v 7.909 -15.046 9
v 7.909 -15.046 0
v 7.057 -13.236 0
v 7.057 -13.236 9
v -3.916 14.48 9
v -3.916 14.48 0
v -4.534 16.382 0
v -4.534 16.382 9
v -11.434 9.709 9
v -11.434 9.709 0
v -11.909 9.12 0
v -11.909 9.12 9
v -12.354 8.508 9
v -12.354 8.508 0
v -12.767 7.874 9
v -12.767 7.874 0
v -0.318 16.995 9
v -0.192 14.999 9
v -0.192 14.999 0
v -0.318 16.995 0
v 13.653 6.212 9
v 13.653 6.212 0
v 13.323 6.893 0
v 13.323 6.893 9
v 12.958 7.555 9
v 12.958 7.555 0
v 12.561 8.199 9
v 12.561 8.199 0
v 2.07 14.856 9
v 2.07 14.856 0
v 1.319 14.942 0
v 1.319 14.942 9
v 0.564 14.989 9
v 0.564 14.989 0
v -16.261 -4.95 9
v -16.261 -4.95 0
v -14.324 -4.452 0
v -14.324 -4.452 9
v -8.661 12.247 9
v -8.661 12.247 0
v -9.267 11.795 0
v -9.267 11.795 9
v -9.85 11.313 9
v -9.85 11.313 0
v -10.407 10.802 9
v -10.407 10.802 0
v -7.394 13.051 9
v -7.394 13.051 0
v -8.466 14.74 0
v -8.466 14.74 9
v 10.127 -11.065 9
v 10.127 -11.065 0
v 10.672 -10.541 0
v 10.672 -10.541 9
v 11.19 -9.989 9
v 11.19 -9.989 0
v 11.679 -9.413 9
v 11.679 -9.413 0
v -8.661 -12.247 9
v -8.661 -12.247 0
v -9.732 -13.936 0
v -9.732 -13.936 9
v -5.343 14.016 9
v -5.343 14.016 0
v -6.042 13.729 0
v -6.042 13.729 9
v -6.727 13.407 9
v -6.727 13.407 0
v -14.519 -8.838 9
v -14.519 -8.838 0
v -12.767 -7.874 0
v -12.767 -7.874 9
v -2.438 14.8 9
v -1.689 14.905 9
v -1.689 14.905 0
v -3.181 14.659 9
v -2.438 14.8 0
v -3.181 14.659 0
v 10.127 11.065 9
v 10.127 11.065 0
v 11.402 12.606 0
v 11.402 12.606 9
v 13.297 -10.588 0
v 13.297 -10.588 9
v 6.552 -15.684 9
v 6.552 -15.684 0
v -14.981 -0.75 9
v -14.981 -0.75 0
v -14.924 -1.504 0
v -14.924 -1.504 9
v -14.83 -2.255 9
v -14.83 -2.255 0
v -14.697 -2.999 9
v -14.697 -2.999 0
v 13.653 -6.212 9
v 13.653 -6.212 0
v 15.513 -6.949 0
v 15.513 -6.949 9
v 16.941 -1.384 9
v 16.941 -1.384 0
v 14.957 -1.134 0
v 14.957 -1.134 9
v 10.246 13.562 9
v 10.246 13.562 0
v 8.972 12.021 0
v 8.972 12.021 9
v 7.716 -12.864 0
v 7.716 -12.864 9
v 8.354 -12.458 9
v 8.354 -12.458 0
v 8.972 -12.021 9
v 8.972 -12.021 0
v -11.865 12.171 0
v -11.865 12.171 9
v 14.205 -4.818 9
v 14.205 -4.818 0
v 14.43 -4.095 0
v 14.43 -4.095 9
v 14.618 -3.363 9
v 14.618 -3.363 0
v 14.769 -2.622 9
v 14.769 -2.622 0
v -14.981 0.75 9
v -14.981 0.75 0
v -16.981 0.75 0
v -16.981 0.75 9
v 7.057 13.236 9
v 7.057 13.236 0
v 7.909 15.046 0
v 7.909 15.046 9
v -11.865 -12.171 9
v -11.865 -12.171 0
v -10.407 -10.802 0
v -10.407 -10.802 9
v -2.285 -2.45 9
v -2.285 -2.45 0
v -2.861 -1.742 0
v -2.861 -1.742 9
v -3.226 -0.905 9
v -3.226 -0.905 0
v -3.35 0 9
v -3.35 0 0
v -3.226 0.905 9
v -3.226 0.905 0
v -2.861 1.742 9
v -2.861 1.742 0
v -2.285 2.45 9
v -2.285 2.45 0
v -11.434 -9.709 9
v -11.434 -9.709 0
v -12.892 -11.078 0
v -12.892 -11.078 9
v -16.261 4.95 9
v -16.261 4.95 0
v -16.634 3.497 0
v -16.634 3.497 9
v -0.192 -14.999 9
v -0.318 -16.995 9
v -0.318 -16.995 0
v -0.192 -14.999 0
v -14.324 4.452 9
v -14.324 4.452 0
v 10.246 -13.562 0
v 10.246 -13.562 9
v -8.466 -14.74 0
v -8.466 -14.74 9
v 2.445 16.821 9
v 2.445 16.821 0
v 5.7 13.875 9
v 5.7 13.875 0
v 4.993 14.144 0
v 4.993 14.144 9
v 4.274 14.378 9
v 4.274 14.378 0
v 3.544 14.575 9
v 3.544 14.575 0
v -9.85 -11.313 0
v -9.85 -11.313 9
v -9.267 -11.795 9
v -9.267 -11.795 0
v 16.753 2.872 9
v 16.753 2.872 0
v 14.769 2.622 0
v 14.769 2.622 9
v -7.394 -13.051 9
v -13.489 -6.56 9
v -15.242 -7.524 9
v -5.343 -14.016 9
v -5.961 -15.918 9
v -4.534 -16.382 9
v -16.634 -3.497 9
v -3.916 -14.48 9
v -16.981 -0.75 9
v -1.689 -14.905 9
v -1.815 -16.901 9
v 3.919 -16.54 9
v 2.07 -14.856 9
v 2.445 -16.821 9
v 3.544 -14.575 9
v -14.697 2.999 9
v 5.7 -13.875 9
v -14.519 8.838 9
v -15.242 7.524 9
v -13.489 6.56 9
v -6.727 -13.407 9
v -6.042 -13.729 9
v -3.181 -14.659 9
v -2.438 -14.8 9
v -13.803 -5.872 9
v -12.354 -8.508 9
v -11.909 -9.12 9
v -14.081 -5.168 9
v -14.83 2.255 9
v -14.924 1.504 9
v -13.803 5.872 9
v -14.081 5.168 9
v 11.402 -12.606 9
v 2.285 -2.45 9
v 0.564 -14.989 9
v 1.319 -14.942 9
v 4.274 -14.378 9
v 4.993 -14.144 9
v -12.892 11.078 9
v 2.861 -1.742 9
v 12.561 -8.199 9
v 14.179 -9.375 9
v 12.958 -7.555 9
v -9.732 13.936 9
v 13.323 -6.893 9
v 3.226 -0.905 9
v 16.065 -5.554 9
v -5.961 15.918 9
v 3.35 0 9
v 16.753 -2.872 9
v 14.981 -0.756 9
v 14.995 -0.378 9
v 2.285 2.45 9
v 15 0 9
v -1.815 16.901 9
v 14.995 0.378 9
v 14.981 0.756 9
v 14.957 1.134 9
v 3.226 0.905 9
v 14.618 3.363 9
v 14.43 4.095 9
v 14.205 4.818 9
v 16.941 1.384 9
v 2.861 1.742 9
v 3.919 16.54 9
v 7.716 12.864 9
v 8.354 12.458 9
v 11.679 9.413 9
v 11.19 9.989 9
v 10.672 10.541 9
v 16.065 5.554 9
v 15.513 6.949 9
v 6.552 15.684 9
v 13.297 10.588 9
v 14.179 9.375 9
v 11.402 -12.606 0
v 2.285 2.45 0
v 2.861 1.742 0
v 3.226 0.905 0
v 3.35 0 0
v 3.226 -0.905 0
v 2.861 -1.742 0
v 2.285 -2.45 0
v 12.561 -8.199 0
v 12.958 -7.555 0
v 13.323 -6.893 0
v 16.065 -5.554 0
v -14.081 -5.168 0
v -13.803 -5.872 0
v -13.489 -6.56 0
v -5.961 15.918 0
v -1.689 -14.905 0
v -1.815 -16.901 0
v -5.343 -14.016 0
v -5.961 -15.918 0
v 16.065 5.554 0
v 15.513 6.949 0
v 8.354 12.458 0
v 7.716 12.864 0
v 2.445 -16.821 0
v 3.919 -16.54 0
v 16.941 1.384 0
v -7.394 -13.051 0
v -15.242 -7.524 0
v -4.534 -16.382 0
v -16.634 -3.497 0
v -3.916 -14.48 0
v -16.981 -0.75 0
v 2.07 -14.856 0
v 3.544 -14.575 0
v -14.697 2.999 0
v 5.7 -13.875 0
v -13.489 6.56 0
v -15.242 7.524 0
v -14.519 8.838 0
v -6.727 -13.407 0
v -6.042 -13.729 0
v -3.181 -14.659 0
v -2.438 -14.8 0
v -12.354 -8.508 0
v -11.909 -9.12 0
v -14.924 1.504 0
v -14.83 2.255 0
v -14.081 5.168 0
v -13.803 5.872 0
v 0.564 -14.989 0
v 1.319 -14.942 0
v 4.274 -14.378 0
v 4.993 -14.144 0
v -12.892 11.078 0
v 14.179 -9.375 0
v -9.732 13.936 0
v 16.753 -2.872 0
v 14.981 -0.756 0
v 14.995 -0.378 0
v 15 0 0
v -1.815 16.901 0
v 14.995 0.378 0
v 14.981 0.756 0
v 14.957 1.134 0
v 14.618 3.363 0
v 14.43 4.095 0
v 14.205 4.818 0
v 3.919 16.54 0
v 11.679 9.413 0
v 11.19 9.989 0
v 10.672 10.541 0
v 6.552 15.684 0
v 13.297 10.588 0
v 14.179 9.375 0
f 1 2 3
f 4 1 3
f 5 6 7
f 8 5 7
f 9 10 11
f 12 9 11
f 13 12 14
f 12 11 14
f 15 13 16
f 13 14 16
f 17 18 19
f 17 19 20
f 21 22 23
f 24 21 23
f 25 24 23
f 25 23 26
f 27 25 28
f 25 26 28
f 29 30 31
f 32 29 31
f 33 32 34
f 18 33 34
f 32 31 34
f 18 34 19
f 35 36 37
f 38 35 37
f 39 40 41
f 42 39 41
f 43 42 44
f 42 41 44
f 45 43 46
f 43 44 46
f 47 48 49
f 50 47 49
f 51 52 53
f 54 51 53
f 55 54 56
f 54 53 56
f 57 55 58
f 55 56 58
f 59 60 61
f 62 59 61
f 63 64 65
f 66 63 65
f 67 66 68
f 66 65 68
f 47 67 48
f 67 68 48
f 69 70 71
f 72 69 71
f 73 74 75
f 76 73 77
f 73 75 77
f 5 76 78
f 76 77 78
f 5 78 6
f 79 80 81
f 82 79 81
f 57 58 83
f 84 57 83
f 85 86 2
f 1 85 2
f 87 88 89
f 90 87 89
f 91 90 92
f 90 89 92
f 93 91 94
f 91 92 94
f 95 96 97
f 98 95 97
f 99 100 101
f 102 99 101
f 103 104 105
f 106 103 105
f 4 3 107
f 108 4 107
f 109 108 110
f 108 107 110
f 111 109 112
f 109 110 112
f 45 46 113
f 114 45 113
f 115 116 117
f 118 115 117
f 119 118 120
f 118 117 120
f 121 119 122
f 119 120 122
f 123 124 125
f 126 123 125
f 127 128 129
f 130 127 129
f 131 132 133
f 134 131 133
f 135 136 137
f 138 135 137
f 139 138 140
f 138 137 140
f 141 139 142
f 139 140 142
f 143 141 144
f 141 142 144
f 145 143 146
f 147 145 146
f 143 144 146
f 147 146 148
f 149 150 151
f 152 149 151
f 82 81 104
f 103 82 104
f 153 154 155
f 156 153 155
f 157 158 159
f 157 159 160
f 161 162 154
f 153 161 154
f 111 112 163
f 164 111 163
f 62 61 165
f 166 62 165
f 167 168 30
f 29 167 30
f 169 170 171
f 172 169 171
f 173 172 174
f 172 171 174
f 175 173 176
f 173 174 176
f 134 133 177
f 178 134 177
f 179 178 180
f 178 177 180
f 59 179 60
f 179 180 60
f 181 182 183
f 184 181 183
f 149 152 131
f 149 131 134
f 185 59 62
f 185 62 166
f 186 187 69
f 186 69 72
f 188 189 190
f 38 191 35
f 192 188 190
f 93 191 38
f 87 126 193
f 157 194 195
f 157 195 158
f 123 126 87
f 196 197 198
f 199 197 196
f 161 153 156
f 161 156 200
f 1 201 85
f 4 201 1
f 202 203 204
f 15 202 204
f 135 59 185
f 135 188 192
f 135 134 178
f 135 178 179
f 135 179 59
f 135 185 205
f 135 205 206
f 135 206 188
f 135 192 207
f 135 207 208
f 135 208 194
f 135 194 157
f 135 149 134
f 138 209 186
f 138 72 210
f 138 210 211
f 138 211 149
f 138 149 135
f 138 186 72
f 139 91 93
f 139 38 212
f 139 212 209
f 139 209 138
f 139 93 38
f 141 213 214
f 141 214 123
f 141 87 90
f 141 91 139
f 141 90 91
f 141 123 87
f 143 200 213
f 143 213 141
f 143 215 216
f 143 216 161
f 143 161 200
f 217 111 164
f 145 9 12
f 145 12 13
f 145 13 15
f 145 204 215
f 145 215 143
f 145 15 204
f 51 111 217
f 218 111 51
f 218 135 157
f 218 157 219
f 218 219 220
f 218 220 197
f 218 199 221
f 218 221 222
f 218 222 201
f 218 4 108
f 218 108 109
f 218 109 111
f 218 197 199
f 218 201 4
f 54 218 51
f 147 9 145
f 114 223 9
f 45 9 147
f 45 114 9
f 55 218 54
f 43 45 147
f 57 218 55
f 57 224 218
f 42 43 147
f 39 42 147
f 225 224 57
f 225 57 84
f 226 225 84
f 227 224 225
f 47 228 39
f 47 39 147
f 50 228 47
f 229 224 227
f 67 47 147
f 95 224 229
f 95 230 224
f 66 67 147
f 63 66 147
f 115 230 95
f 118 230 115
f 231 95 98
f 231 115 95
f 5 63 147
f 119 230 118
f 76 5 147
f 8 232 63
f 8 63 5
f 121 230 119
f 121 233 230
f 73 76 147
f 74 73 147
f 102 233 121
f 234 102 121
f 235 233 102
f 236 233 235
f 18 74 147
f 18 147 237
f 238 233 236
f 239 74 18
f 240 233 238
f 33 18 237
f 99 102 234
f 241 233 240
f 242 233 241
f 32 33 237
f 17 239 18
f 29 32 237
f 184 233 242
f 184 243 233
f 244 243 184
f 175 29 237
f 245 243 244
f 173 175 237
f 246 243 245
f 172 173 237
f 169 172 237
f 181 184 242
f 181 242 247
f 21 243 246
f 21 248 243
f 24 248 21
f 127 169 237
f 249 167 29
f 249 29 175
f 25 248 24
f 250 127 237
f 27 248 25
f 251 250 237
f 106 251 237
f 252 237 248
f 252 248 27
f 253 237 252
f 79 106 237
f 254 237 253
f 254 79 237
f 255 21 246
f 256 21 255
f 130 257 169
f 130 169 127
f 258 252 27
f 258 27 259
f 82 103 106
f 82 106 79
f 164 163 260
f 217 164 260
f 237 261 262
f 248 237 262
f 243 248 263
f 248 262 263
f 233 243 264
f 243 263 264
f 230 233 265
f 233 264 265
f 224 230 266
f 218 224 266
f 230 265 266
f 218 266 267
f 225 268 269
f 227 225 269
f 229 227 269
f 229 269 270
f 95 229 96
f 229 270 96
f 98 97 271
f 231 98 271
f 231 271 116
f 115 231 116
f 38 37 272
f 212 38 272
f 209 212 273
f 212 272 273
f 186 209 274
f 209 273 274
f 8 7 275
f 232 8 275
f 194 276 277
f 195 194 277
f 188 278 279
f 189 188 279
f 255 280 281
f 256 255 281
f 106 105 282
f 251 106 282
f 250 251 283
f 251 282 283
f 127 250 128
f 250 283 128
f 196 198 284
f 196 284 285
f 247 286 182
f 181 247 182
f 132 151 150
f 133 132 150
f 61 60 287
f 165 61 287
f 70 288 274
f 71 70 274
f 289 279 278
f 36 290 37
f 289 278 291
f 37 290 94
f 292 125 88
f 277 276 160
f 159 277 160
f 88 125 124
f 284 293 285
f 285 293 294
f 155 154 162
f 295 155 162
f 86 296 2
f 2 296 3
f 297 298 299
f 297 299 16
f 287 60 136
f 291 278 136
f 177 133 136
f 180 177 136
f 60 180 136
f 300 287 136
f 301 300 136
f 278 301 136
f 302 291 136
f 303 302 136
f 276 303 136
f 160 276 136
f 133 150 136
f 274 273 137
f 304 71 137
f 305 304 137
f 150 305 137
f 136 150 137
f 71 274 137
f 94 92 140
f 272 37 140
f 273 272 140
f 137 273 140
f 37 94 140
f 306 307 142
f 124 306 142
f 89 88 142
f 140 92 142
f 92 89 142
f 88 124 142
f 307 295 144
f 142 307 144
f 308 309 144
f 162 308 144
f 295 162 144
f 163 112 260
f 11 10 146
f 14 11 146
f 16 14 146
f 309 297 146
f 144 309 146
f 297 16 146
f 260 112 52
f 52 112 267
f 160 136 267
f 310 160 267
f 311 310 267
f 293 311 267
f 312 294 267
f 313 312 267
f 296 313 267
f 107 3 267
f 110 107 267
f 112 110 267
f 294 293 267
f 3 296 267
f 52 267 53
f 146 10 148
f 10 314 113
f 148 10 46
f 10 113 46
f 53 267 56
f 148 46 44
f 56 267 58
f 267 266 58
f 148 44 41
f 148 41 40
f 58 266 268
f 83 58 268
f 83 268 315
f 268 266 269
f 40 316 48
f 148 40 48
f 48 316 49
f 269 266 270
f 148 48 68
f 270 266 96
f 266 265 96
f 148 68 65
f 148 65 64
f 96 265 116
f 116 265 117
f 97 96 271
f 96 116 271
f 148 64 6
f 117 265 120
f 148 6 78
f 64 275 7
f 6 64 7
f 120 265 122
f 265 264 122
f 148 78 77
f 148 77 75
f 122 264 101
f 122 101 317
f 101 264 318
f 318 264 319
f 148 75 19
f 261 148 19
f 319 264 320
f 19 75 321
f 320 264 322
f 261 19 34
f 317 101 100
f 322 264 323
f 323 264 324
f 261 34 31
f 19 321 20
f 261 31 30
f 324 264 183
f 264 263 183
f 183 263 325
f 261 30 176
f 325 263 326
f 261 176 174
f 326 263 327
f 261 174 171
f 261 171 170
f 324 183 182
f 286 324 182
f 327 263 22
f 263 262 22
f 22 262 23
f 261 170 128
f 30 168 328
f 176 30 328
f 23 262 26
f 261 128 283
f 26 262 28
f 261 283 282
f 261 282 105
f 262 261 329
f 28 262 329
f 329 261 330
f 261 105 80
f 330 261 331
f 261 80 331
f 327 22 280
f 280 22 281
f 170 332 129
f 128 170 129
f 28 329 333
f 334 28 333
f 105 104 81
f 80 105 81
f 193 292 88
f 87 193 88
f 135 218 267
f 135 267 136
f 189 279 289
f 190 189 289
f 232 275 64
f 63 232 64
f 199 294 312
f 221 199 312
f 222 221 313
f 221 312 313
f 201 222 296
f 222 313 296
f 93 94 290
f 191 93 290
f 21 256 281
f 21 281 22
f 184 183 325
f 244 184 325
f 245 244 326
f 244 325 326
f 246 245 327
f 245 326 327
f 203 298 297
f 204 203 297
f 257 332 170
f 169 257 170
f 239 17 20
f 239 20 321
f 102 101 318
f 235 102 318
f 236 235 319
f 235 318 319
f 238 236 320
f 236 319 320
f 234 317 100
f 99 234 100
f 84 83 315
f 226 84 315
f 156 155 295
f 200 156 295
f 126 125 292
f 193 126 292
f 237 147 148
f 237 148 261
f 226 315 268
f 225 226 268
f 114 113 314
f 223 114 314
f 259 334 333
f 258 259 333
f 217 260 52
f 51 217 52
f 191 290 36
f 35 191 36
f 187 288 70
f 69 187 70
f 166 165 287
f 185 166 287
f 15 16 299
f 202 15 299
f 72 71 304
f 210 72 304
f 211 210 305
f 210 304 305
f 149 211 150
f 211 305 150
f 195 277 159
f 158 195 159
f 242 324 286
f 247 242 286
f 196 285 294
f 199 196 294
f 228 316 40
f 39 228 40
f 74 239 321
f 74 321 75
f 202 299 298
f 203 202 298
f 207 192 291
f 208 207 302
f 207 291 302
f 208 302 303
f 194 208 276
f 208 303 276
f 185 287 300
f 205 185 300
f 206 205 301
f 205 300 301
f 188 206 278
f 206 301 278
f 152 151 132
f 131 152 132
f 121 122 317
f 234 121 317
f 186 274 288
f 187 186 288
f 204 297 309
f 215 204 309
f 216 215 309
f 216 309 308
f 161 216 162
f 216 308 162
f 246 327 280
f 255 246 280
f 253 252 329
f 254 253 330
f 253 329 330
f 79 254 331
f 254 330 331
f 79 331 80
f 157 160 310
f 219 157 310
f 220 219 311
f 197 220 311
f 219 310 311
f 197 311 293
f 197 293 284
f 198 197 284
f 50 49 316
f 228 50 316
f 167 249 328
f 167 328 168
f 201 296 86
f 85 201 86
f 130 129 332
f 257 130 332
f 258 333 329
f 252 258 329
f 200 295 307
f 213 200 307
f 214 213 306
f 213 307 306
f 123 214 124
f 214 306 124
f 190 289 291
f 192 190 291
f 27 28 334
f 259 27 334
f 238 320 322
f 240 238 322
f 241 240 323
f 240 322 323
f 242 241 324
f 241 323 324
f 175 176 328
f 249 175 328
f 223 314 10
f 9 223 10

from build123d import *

# Parameters (mm, degrees)
F1_DEPTH = 9


with BuildPart() as f1:
    # F0 (on Top) → F1 (new body)
    with BuildSketch(Plane.XY):
        with BuildLine():
            ThreePointArc((-14.697093, 2.999245), (-14.528747, 3.730348), (-14.324058, 4.45212))
            Line((-14.324058, 4.45212), (-16.261224, 4.9495))
            Line((-16.261224, 4.9495), (-16.634259, 3.496625))
            Line((-16.634259, 3.496625), (-14.697093, 2.999245))
        make_face()
        with BuildLine():
            ThreePointArc((-13.489474, 6.560037), (-13.1446, 7.226305), (-12.766844, 7.874497))
            Line((-12.766844, 7.874497), (-14.519457, 8.838004))
            Line((-14.519457, 8.838004), (-15.242088, 7.523544))
            Line((-15.242088, 7.523544), (-13.489474, 6.560037))
        make_face()
        with BuildLine():
            ThreePointArc((-11.434263, 9.708637), (-10.934529, 10.268207), (-10.407442, 10.80209))
            Line((-10.407442, 10.80209), (-11.86538, 12.171184))
            Line((-11.86538, 12.171184), (-12.8922, 11.077731))
            Line((-12.8922, 11.077731), (-11.434263, 9.708637))
        make_face()
        with BuildLine():
            ThreePointArc((-8.660595, 12.247208), (-8.037402, 12.664919), (-7.394103, 13.050948))
            Line((-7.394103, 13.050948), (-8.465757, 14.739604))
            Line((-8.465757, 14.739604), (-9.732248, 13.935864))
            Line((-9.732248, 13.935864), (-8.660595, 12.247208))
        make_face()
        with BuildLine():
            ThreePointArc((-14.981238, -0.75), (-15, 0), (-14.981238, 0.75))
            Line((-14.981238, 0.75), (-16.981238, 0.75))
            Line((-16.981238, 0.75), (-16.981238, -0.75))
            Line((-16.981238, -0.75), (-14.981238, -0.75))
        make_face()
        with BuildLine():
            Line((-16.261224, -4.9495), (-14.324058, -4.45212))
            ThreePointArc((-14.324058, -4.45212), (-14.528747, -3.730348), (-14.697093, -2.999245))
            Line((-14.697093, -2.999245), (-16.634259, -3.496625))
            Line((-16.634259, -3.496625), (-16.261224, -4.9495))
        make_face()
        with BuildLine():
            Line((-14.519457, -8.838004), (-12.766844, -7.874497))
            ThreePointArc((-12.766844, -7.874497), (-13.1446, -7.226305), (-13.489474, -6.560037))
            Line((-13.489474, -6.560037), (-15.242088, -7.523544))
            Line((-15.242088, -7.523544), (-14.519457, -8.838004))
        make_face()
        with BuildLine():
            ThreePointArc((14.957107, -1.133561), (14.989273, -0.567186), (15, 0))
            ThreePointArc((15, 0), (14.989273, 0.567186), (14.957107, 1.133561))
            ThreePointArc((14.957107, 1.133561), (14.881721, 1.879999), (14.769107, 2.621733))
            ThreePointArc((14.769107, 2.621733), (14.528747, 3.730348), (14.205296, 4.817629))
            ThreePointArc((14.205296, 4.817629), (13.946647, 5.521868), (13.65311, 6.212294))
            ThreePointArc((13.65311, 6.212294), (13.1446, 7.226305), (12.560915, 8.198988))
            ThreePointArc((12.560915, 8.198988), (12.135255, 8.816779), (11.679237, 9.412514))
            ThreePointArc((11.679237, 9.412514), (10.934529, 10.268207), (10.127286, 11.065174))
            ThreePointArc((10.127286, 11.065174), (9.56136, 11.557699), (8.971516, 12.02131))
            ThreePointArc((8.971516, 12.02131), (8.037402, 12.664919), (7.057321, 13.236095))
            ThreePointArc((7.057321, 13.236095), (6.386689, 13.572406), (5.700081, 13.874764))
            ThreePointArc((5.700081, 13.874764), (4.635255, 14.265848), (3.54392, 14.575343))
            ThreePointArc((3.54392, 14.575343), (2.81072, 14.734309), (2.070489, 14.856415))
            ThreePointArc((2.070489, 14.856415), (0.941858, 14.970401), (-0.19216, 14.998769))
            ThreePointArc((-0.19216, 14.998769), (-0.941858, 14.970401), (-1.6892, 14.904583))
            ThreePointArc((-1.6892, 14.904583), (-2.81072, 14.734309), (-3.916165, 14.479767))
            ThreePointArc((-3.916165, 14.479767), (-4.635255, 14.265848), (-5.34275, 14.016242))
            ThreePointArc((-5.34275, 14.016242), (-6.386689, 13.572406), (-7.394103, 13.050948))
            ThreePointArc((-7.394103, 13.050948), (-8.037402, 12.664919), (-8.660595, 12.247208))
            ThreePointArc((-8.660595, 12.247208), (-9.56136, 11.557699), (-10.407442, 10.80209))
            ThreePointArc((-10.407442, 10.80209), (-10.934529, 10.268207), (-11.434263, 9.708637))
            ThreePointArc((-11.434263, 9.708637), (-12.135255, 8.816779), (-12.766844, 7.874497))
            ThreePointArc((-12.766844, 7.874497), (-13.1446, 7.226305), (-13.489474, 6.560037))
            ThreePointArc((-13.489474, 6.560037), (-13.946647, 5.521868), (-14.324058, 4.45212))
            ThreePointArc((-14.324058, 4.45212), (-14.528747, 3.730348), (-14.697093, 2.999245))
            ThreePointArc((-14.697093, 2.999245), (-14.881721, 1.879999), (-14.981238, 0.75))
            ThreePointArc((-14.981238, 0.75), (-15, 0), (-14.981238, -0.75))
            ThreePointArc((-14.981238, -0.75), (-14.881721, -1.879999), (-14.697093, -2.999245))
            ThreePointArc((-14.697093, -2.999245), (-14.528747, -3.730348), (-14.324058, -4.45212))
            ThreePointArc((-14.324058, -4.45212), (-13.946647, -5.521868), (-13.489474, -6.560037))
            ThreePointArc((-13.489474, -6.560037), (-13.1446, -7.226305), (-12.766844, -7.874497))
            ThreePointArc((-12.766844, -7.874497), (-12.135255, -8.816779), (-11.434263, -9.708637))
            ThreePointArc((-11.434263, -9.708637), (-10.934529, -10.268207), (-10.407442, -10.80209))
            ThreePointArc((-10.407442, -10.80209), (-9.56136, -11.557699), (-8.660595, -12.247208))
            ThreePointArc((-8.660595, -12.247208), (-8.037402, -12.664919), (-7.394103, -13.050948))
            ThreePointArc((-7.394103, -13.050948), (-6.386689, -13.572406), (-5.34275, -14.016242))
            ThreePointArc((-5.34275, -14.016242), (-4.635255, -14.265848), (-3.916165, -14.479767))
            ThreePointArc((-3.916165, -14.479767), (-2.81072, -14.734309), (-1.6892, -14.904583))
            ThreePointArc((-1.6892, -14.904583), (-0.941858, -14.970401), (-0.19216, -14.998769))
            ThreePointArc((-0.19216, -14.998769), (0.941858, -14.970401), (2.070489, -14.856415))
            ThreePointArc((2.070489, -14.856415), (2.81072, -14.734309), (3.54392, -14.575343))
            ThreePointArc((3.54392, -14.575343), (4.635255, -14.265848), (5.700081, -13.874764))
            ThreePointArc((5.700081, -13.874764), (6.386689, -13.572406), (7.057321, -13.236095))
            ThreePointArc((7.057321, -13.236095), (8.037402, -12.664919), (8.971516, -12.02131))
            ThreePointArc((8.971516, -12.02131), (9.56136, -11.557699), (10.127286, -11.065174))
            ThreePointArc((10.127286, -11.065174), (10.934529, -10.268207), (11.679237, -9.412514))
            ThreePointArc((11.679237, -9.412514), (12.135255, -8.816779), (12.560915, -8.198988))
            ThreePointArc((12.560915, -8.198988), (13.1446, -7.226305), (13.65311, -6.212294))
            ThreePointArc((13.65311, -6.212294), (13.946647, -5.521868), (14.205296, -4.817629))
            ThreePointArc((14.205296, -4.817629), (14.528747, -3.730348), (14.769107, -2.621733))
            ThreePointArc((14.769107, -2.621733), (14.881721, -1.879999), (14.957107, -1.133561))
        make_face()
        with BuildLine():
            ThreePointArc((-2.284732, -2.45), (-3.35, 0), (-2.284732, 2.45))
            Line((-2.284732, 2.45), (2.284732, 2.45))
            ThreePointArc((2.284732, 2.45), (3.35, 0), (2.284732, -2.45))
            Line((2.284732, -2.45), (-2.284732, -2.45))
        make_face(mode=Mode.SUBTRACT)
        with BuildLine():
            Line((-11.86538, -12.171184), (-10.407442, -10.80209))
            ThreePointArc((-10.407442, -10.80209), (-10.934529, -10.268207), (-11.434263, -9.708637))
            Line((-11.434263, -9.708637), (-12.8922, -11.077731))
            Line((-12.8922, -11.077731), (-11.86538, -12.171184))
        make_face()
        with BuildLine():
            Line((-8.465757, -14.739604), (-7.394103, -13.050948))
            ThreePointArc((-7.394103, -13.050948), (-8.037402, -12.664919), (-8.660595, -12.247208))
            Line((-8.660595, -12.247208), (-9.732248, -13.935864))
            Line((-9.732248, -13.935864), (-8.465757, -14.739604))
        make_face()
        with BuildLine():
            ThreePointArc((-5.34275, 14.016242), (-4.635255, 14.265848), (-3.916165, 14.479767))
            Line((-3.916165, 14.479767), (-4.534199, 16.38188))
            Line((-4.534199, 16.38188), (-5.960784, 15.918355))
            Line((-5.960784, 15.918355), (-5.34275, 14.016242))
        make_face()
        with BuildLine():
            ThreePointArc((-1.6892, 14.904583), (-0.941858, 14.970401), (-0.19216, 14.998769))
            Line((-0.19216, 14.998769), (-0.317741, 16.994823))
            Line((-0.317741, 16.994823), (-1.814781, 16.900637))
            Line((-1.814781, 16.900637), (-1.6892, 14.904583))
        make_face()
        with BuildLine():
            ThreePointArc((2.070489, 14.856415), (2.81072, 14.734309), (3.54392, 14.575343))
            Line((3.54392, 14.575343), (3.918682, 16.539918))
            Line((3.918682, 16.539918), (2.445251, 16.82099))
            Line((2.445251, 16.82099), (2.070489, 14.856415))
        make_face()
        with BuildLine():
            ThreePointArc((5.700081, 13.874764), (6.386689, 13.572406), (7.057321, 13.236095))
            Line((7.057321, 13.236095), (7.90888, 15.045749))
            Line((7.90888, 15.045749), (6.551639, 15.684418))
            Line((6.551639, 15.684418), (5.700081, 13.874764))
        make_face()
        with BuildLine():
            ThreePointArc((8.971516, 12.02131), (9.56136, 11.557699), (10.127286, 11.065174))
            Line((10.127286, 11.065174), (11.402134, 12.606201))
            Line((11.402134, 12.606201), (10.246364, 13.562337))
            Line((10.246364, 13.562337), (8.971516, 12.02131))
        make_face()
        with BuildLine():
            ThreePointArc((11.679237, 9.412514), (12.135255, 8.816779), (12.560915, 8.198988))
            Line((12.560915, 8.198988), (14.178949, 9.374559))
            Line((14.178949, 9.374559), (13.297271, 10.588084))
            Line((13.297271, 10.588084), (11.679237, 9.412514))
        make_face()
        with BuildLine():
            ThreePointArc((13.65311, 6.212294), (13.946647, 5.521868), (14.205296, 4.817629))
            Line((14.205296, 4.817629), (16.064849, 5.553878))
            Line((16.064849, 5.553878), (15.512663, 6.948543))
            Line((15.512663, 6.948543), (13.65311, 6.212294))
        make_face()
        with BuildLine():
            ThreePointArc((14.769107, 2.621733), (14.881721, 1.879999), (14.957107, 1.133561))
            Line((14.957107, 1.133561), (16.941336, 1.384227))
            Line((16.941336, 1.384227), (16.753336, 2.8724))
            Line((16.753336, 2.8724), (14.769107, 2.621733))
        make_face()
        with BuildLine():
            Line((16.941336, -1.384227), (14.957107, -1.133561))
            ThreePointArc((14.957107, -1.133561), (14.881721, -1.879999), (14.769107, -2.621733))
            Line((14.769107, -2.621733), (16.753336, -2.8724))
            Line((16.753336, -2.8724), (16.941336, -1.384227))
        make_face()
        with BuildLine():
            Line((16.064849, -5.553878), (14.205296, -4.817629))
            ThreePointArc((14.205296, -4.817629), (13.946647, -5.521868), (13.65311, -6.212294))
            Line((13.65311, -6.212294), (15.512663, -6.948543))
            Line((15.512663, -6.948543), (16.064849, -5.553878))
        make_face()
        with BuildLine():
            Line((14.178949, -9.374559), (12.560915, -8.198988))
            ThreePointArc((12.560915, -8.198988), (12.135255, -8.816779), (11.679237, -9.412514))
            Line((11.679237, -9.412514), (13.297271, -10.588084))
            Line((13.297271, -10.588084), (14.178949, -9.374559))
        make_face()
        with BuildLine():
            Line((11.402134, -12.606201), (10.127286, -11.065174))
            ThreePointArc((10.127286, -11.065174), (9.56136, -11.557699), (8.971516, -12.02131))
            Line((8.971516, -12.02131), (10.246364, -13.562337))
            Line((10.246364, -13.562337), (11.402134, -12.606201))
        make_face()
        with BuildLine():
            Line((7.90888, -15.045749), (7.057321, -13.236095))
            ThreePointArc((7.057321, -13.236095), (6.386689, -13.572406), (5.700081, -13.874764))
            Line((5.700081, -13.874764), (6.551639, -15.684418))
            Line((6.551639, -15.684418), (7.90888, -15.045749))
        make_face()
        with BuildLine():
            Line((3.918682, -16.539918), (3.54392, -14.575343))
            ThreePointArc((3.54392, -14.575343), (2.81072, -14.734309), (2.070489, -14.856415))
            Line((2.070489, -14.856415), (2.445251, -16.82099))
            Line((2.445251, -16.82099), (3.918682, -16.539918))
        make_face()
        with BuildLine():
            Line((-0.317741, -16.994823), (-0.19216, -14.998769))
            ThreePointArc((-0.19216, -14.998769), (-0.941858, -14.970401), (-1.6892, -14.904583))
            Line((-1.6892, -14.904583), (-1.814781, -16.900637))
            Line((-1.814781, -16.900637), (-0.317741, -16.994823))
        make_face()
        with BuildLine():
            Line((-4.534199, -16.38188), (-3.916165, -14.479767))
            ThreePointArc((-3.916165, -14.479767), (-4.635255, -14.265848), (-5.34275, -14.016242))
            Line((-5.34275, -14.016242), (-5.960784, -15.918355))
            Line((-5.960784, -15.918355), (-4.534199, -16.38188))
        make_face()
    extrude(amount=F1_DEPTH)


solid = f1.part
